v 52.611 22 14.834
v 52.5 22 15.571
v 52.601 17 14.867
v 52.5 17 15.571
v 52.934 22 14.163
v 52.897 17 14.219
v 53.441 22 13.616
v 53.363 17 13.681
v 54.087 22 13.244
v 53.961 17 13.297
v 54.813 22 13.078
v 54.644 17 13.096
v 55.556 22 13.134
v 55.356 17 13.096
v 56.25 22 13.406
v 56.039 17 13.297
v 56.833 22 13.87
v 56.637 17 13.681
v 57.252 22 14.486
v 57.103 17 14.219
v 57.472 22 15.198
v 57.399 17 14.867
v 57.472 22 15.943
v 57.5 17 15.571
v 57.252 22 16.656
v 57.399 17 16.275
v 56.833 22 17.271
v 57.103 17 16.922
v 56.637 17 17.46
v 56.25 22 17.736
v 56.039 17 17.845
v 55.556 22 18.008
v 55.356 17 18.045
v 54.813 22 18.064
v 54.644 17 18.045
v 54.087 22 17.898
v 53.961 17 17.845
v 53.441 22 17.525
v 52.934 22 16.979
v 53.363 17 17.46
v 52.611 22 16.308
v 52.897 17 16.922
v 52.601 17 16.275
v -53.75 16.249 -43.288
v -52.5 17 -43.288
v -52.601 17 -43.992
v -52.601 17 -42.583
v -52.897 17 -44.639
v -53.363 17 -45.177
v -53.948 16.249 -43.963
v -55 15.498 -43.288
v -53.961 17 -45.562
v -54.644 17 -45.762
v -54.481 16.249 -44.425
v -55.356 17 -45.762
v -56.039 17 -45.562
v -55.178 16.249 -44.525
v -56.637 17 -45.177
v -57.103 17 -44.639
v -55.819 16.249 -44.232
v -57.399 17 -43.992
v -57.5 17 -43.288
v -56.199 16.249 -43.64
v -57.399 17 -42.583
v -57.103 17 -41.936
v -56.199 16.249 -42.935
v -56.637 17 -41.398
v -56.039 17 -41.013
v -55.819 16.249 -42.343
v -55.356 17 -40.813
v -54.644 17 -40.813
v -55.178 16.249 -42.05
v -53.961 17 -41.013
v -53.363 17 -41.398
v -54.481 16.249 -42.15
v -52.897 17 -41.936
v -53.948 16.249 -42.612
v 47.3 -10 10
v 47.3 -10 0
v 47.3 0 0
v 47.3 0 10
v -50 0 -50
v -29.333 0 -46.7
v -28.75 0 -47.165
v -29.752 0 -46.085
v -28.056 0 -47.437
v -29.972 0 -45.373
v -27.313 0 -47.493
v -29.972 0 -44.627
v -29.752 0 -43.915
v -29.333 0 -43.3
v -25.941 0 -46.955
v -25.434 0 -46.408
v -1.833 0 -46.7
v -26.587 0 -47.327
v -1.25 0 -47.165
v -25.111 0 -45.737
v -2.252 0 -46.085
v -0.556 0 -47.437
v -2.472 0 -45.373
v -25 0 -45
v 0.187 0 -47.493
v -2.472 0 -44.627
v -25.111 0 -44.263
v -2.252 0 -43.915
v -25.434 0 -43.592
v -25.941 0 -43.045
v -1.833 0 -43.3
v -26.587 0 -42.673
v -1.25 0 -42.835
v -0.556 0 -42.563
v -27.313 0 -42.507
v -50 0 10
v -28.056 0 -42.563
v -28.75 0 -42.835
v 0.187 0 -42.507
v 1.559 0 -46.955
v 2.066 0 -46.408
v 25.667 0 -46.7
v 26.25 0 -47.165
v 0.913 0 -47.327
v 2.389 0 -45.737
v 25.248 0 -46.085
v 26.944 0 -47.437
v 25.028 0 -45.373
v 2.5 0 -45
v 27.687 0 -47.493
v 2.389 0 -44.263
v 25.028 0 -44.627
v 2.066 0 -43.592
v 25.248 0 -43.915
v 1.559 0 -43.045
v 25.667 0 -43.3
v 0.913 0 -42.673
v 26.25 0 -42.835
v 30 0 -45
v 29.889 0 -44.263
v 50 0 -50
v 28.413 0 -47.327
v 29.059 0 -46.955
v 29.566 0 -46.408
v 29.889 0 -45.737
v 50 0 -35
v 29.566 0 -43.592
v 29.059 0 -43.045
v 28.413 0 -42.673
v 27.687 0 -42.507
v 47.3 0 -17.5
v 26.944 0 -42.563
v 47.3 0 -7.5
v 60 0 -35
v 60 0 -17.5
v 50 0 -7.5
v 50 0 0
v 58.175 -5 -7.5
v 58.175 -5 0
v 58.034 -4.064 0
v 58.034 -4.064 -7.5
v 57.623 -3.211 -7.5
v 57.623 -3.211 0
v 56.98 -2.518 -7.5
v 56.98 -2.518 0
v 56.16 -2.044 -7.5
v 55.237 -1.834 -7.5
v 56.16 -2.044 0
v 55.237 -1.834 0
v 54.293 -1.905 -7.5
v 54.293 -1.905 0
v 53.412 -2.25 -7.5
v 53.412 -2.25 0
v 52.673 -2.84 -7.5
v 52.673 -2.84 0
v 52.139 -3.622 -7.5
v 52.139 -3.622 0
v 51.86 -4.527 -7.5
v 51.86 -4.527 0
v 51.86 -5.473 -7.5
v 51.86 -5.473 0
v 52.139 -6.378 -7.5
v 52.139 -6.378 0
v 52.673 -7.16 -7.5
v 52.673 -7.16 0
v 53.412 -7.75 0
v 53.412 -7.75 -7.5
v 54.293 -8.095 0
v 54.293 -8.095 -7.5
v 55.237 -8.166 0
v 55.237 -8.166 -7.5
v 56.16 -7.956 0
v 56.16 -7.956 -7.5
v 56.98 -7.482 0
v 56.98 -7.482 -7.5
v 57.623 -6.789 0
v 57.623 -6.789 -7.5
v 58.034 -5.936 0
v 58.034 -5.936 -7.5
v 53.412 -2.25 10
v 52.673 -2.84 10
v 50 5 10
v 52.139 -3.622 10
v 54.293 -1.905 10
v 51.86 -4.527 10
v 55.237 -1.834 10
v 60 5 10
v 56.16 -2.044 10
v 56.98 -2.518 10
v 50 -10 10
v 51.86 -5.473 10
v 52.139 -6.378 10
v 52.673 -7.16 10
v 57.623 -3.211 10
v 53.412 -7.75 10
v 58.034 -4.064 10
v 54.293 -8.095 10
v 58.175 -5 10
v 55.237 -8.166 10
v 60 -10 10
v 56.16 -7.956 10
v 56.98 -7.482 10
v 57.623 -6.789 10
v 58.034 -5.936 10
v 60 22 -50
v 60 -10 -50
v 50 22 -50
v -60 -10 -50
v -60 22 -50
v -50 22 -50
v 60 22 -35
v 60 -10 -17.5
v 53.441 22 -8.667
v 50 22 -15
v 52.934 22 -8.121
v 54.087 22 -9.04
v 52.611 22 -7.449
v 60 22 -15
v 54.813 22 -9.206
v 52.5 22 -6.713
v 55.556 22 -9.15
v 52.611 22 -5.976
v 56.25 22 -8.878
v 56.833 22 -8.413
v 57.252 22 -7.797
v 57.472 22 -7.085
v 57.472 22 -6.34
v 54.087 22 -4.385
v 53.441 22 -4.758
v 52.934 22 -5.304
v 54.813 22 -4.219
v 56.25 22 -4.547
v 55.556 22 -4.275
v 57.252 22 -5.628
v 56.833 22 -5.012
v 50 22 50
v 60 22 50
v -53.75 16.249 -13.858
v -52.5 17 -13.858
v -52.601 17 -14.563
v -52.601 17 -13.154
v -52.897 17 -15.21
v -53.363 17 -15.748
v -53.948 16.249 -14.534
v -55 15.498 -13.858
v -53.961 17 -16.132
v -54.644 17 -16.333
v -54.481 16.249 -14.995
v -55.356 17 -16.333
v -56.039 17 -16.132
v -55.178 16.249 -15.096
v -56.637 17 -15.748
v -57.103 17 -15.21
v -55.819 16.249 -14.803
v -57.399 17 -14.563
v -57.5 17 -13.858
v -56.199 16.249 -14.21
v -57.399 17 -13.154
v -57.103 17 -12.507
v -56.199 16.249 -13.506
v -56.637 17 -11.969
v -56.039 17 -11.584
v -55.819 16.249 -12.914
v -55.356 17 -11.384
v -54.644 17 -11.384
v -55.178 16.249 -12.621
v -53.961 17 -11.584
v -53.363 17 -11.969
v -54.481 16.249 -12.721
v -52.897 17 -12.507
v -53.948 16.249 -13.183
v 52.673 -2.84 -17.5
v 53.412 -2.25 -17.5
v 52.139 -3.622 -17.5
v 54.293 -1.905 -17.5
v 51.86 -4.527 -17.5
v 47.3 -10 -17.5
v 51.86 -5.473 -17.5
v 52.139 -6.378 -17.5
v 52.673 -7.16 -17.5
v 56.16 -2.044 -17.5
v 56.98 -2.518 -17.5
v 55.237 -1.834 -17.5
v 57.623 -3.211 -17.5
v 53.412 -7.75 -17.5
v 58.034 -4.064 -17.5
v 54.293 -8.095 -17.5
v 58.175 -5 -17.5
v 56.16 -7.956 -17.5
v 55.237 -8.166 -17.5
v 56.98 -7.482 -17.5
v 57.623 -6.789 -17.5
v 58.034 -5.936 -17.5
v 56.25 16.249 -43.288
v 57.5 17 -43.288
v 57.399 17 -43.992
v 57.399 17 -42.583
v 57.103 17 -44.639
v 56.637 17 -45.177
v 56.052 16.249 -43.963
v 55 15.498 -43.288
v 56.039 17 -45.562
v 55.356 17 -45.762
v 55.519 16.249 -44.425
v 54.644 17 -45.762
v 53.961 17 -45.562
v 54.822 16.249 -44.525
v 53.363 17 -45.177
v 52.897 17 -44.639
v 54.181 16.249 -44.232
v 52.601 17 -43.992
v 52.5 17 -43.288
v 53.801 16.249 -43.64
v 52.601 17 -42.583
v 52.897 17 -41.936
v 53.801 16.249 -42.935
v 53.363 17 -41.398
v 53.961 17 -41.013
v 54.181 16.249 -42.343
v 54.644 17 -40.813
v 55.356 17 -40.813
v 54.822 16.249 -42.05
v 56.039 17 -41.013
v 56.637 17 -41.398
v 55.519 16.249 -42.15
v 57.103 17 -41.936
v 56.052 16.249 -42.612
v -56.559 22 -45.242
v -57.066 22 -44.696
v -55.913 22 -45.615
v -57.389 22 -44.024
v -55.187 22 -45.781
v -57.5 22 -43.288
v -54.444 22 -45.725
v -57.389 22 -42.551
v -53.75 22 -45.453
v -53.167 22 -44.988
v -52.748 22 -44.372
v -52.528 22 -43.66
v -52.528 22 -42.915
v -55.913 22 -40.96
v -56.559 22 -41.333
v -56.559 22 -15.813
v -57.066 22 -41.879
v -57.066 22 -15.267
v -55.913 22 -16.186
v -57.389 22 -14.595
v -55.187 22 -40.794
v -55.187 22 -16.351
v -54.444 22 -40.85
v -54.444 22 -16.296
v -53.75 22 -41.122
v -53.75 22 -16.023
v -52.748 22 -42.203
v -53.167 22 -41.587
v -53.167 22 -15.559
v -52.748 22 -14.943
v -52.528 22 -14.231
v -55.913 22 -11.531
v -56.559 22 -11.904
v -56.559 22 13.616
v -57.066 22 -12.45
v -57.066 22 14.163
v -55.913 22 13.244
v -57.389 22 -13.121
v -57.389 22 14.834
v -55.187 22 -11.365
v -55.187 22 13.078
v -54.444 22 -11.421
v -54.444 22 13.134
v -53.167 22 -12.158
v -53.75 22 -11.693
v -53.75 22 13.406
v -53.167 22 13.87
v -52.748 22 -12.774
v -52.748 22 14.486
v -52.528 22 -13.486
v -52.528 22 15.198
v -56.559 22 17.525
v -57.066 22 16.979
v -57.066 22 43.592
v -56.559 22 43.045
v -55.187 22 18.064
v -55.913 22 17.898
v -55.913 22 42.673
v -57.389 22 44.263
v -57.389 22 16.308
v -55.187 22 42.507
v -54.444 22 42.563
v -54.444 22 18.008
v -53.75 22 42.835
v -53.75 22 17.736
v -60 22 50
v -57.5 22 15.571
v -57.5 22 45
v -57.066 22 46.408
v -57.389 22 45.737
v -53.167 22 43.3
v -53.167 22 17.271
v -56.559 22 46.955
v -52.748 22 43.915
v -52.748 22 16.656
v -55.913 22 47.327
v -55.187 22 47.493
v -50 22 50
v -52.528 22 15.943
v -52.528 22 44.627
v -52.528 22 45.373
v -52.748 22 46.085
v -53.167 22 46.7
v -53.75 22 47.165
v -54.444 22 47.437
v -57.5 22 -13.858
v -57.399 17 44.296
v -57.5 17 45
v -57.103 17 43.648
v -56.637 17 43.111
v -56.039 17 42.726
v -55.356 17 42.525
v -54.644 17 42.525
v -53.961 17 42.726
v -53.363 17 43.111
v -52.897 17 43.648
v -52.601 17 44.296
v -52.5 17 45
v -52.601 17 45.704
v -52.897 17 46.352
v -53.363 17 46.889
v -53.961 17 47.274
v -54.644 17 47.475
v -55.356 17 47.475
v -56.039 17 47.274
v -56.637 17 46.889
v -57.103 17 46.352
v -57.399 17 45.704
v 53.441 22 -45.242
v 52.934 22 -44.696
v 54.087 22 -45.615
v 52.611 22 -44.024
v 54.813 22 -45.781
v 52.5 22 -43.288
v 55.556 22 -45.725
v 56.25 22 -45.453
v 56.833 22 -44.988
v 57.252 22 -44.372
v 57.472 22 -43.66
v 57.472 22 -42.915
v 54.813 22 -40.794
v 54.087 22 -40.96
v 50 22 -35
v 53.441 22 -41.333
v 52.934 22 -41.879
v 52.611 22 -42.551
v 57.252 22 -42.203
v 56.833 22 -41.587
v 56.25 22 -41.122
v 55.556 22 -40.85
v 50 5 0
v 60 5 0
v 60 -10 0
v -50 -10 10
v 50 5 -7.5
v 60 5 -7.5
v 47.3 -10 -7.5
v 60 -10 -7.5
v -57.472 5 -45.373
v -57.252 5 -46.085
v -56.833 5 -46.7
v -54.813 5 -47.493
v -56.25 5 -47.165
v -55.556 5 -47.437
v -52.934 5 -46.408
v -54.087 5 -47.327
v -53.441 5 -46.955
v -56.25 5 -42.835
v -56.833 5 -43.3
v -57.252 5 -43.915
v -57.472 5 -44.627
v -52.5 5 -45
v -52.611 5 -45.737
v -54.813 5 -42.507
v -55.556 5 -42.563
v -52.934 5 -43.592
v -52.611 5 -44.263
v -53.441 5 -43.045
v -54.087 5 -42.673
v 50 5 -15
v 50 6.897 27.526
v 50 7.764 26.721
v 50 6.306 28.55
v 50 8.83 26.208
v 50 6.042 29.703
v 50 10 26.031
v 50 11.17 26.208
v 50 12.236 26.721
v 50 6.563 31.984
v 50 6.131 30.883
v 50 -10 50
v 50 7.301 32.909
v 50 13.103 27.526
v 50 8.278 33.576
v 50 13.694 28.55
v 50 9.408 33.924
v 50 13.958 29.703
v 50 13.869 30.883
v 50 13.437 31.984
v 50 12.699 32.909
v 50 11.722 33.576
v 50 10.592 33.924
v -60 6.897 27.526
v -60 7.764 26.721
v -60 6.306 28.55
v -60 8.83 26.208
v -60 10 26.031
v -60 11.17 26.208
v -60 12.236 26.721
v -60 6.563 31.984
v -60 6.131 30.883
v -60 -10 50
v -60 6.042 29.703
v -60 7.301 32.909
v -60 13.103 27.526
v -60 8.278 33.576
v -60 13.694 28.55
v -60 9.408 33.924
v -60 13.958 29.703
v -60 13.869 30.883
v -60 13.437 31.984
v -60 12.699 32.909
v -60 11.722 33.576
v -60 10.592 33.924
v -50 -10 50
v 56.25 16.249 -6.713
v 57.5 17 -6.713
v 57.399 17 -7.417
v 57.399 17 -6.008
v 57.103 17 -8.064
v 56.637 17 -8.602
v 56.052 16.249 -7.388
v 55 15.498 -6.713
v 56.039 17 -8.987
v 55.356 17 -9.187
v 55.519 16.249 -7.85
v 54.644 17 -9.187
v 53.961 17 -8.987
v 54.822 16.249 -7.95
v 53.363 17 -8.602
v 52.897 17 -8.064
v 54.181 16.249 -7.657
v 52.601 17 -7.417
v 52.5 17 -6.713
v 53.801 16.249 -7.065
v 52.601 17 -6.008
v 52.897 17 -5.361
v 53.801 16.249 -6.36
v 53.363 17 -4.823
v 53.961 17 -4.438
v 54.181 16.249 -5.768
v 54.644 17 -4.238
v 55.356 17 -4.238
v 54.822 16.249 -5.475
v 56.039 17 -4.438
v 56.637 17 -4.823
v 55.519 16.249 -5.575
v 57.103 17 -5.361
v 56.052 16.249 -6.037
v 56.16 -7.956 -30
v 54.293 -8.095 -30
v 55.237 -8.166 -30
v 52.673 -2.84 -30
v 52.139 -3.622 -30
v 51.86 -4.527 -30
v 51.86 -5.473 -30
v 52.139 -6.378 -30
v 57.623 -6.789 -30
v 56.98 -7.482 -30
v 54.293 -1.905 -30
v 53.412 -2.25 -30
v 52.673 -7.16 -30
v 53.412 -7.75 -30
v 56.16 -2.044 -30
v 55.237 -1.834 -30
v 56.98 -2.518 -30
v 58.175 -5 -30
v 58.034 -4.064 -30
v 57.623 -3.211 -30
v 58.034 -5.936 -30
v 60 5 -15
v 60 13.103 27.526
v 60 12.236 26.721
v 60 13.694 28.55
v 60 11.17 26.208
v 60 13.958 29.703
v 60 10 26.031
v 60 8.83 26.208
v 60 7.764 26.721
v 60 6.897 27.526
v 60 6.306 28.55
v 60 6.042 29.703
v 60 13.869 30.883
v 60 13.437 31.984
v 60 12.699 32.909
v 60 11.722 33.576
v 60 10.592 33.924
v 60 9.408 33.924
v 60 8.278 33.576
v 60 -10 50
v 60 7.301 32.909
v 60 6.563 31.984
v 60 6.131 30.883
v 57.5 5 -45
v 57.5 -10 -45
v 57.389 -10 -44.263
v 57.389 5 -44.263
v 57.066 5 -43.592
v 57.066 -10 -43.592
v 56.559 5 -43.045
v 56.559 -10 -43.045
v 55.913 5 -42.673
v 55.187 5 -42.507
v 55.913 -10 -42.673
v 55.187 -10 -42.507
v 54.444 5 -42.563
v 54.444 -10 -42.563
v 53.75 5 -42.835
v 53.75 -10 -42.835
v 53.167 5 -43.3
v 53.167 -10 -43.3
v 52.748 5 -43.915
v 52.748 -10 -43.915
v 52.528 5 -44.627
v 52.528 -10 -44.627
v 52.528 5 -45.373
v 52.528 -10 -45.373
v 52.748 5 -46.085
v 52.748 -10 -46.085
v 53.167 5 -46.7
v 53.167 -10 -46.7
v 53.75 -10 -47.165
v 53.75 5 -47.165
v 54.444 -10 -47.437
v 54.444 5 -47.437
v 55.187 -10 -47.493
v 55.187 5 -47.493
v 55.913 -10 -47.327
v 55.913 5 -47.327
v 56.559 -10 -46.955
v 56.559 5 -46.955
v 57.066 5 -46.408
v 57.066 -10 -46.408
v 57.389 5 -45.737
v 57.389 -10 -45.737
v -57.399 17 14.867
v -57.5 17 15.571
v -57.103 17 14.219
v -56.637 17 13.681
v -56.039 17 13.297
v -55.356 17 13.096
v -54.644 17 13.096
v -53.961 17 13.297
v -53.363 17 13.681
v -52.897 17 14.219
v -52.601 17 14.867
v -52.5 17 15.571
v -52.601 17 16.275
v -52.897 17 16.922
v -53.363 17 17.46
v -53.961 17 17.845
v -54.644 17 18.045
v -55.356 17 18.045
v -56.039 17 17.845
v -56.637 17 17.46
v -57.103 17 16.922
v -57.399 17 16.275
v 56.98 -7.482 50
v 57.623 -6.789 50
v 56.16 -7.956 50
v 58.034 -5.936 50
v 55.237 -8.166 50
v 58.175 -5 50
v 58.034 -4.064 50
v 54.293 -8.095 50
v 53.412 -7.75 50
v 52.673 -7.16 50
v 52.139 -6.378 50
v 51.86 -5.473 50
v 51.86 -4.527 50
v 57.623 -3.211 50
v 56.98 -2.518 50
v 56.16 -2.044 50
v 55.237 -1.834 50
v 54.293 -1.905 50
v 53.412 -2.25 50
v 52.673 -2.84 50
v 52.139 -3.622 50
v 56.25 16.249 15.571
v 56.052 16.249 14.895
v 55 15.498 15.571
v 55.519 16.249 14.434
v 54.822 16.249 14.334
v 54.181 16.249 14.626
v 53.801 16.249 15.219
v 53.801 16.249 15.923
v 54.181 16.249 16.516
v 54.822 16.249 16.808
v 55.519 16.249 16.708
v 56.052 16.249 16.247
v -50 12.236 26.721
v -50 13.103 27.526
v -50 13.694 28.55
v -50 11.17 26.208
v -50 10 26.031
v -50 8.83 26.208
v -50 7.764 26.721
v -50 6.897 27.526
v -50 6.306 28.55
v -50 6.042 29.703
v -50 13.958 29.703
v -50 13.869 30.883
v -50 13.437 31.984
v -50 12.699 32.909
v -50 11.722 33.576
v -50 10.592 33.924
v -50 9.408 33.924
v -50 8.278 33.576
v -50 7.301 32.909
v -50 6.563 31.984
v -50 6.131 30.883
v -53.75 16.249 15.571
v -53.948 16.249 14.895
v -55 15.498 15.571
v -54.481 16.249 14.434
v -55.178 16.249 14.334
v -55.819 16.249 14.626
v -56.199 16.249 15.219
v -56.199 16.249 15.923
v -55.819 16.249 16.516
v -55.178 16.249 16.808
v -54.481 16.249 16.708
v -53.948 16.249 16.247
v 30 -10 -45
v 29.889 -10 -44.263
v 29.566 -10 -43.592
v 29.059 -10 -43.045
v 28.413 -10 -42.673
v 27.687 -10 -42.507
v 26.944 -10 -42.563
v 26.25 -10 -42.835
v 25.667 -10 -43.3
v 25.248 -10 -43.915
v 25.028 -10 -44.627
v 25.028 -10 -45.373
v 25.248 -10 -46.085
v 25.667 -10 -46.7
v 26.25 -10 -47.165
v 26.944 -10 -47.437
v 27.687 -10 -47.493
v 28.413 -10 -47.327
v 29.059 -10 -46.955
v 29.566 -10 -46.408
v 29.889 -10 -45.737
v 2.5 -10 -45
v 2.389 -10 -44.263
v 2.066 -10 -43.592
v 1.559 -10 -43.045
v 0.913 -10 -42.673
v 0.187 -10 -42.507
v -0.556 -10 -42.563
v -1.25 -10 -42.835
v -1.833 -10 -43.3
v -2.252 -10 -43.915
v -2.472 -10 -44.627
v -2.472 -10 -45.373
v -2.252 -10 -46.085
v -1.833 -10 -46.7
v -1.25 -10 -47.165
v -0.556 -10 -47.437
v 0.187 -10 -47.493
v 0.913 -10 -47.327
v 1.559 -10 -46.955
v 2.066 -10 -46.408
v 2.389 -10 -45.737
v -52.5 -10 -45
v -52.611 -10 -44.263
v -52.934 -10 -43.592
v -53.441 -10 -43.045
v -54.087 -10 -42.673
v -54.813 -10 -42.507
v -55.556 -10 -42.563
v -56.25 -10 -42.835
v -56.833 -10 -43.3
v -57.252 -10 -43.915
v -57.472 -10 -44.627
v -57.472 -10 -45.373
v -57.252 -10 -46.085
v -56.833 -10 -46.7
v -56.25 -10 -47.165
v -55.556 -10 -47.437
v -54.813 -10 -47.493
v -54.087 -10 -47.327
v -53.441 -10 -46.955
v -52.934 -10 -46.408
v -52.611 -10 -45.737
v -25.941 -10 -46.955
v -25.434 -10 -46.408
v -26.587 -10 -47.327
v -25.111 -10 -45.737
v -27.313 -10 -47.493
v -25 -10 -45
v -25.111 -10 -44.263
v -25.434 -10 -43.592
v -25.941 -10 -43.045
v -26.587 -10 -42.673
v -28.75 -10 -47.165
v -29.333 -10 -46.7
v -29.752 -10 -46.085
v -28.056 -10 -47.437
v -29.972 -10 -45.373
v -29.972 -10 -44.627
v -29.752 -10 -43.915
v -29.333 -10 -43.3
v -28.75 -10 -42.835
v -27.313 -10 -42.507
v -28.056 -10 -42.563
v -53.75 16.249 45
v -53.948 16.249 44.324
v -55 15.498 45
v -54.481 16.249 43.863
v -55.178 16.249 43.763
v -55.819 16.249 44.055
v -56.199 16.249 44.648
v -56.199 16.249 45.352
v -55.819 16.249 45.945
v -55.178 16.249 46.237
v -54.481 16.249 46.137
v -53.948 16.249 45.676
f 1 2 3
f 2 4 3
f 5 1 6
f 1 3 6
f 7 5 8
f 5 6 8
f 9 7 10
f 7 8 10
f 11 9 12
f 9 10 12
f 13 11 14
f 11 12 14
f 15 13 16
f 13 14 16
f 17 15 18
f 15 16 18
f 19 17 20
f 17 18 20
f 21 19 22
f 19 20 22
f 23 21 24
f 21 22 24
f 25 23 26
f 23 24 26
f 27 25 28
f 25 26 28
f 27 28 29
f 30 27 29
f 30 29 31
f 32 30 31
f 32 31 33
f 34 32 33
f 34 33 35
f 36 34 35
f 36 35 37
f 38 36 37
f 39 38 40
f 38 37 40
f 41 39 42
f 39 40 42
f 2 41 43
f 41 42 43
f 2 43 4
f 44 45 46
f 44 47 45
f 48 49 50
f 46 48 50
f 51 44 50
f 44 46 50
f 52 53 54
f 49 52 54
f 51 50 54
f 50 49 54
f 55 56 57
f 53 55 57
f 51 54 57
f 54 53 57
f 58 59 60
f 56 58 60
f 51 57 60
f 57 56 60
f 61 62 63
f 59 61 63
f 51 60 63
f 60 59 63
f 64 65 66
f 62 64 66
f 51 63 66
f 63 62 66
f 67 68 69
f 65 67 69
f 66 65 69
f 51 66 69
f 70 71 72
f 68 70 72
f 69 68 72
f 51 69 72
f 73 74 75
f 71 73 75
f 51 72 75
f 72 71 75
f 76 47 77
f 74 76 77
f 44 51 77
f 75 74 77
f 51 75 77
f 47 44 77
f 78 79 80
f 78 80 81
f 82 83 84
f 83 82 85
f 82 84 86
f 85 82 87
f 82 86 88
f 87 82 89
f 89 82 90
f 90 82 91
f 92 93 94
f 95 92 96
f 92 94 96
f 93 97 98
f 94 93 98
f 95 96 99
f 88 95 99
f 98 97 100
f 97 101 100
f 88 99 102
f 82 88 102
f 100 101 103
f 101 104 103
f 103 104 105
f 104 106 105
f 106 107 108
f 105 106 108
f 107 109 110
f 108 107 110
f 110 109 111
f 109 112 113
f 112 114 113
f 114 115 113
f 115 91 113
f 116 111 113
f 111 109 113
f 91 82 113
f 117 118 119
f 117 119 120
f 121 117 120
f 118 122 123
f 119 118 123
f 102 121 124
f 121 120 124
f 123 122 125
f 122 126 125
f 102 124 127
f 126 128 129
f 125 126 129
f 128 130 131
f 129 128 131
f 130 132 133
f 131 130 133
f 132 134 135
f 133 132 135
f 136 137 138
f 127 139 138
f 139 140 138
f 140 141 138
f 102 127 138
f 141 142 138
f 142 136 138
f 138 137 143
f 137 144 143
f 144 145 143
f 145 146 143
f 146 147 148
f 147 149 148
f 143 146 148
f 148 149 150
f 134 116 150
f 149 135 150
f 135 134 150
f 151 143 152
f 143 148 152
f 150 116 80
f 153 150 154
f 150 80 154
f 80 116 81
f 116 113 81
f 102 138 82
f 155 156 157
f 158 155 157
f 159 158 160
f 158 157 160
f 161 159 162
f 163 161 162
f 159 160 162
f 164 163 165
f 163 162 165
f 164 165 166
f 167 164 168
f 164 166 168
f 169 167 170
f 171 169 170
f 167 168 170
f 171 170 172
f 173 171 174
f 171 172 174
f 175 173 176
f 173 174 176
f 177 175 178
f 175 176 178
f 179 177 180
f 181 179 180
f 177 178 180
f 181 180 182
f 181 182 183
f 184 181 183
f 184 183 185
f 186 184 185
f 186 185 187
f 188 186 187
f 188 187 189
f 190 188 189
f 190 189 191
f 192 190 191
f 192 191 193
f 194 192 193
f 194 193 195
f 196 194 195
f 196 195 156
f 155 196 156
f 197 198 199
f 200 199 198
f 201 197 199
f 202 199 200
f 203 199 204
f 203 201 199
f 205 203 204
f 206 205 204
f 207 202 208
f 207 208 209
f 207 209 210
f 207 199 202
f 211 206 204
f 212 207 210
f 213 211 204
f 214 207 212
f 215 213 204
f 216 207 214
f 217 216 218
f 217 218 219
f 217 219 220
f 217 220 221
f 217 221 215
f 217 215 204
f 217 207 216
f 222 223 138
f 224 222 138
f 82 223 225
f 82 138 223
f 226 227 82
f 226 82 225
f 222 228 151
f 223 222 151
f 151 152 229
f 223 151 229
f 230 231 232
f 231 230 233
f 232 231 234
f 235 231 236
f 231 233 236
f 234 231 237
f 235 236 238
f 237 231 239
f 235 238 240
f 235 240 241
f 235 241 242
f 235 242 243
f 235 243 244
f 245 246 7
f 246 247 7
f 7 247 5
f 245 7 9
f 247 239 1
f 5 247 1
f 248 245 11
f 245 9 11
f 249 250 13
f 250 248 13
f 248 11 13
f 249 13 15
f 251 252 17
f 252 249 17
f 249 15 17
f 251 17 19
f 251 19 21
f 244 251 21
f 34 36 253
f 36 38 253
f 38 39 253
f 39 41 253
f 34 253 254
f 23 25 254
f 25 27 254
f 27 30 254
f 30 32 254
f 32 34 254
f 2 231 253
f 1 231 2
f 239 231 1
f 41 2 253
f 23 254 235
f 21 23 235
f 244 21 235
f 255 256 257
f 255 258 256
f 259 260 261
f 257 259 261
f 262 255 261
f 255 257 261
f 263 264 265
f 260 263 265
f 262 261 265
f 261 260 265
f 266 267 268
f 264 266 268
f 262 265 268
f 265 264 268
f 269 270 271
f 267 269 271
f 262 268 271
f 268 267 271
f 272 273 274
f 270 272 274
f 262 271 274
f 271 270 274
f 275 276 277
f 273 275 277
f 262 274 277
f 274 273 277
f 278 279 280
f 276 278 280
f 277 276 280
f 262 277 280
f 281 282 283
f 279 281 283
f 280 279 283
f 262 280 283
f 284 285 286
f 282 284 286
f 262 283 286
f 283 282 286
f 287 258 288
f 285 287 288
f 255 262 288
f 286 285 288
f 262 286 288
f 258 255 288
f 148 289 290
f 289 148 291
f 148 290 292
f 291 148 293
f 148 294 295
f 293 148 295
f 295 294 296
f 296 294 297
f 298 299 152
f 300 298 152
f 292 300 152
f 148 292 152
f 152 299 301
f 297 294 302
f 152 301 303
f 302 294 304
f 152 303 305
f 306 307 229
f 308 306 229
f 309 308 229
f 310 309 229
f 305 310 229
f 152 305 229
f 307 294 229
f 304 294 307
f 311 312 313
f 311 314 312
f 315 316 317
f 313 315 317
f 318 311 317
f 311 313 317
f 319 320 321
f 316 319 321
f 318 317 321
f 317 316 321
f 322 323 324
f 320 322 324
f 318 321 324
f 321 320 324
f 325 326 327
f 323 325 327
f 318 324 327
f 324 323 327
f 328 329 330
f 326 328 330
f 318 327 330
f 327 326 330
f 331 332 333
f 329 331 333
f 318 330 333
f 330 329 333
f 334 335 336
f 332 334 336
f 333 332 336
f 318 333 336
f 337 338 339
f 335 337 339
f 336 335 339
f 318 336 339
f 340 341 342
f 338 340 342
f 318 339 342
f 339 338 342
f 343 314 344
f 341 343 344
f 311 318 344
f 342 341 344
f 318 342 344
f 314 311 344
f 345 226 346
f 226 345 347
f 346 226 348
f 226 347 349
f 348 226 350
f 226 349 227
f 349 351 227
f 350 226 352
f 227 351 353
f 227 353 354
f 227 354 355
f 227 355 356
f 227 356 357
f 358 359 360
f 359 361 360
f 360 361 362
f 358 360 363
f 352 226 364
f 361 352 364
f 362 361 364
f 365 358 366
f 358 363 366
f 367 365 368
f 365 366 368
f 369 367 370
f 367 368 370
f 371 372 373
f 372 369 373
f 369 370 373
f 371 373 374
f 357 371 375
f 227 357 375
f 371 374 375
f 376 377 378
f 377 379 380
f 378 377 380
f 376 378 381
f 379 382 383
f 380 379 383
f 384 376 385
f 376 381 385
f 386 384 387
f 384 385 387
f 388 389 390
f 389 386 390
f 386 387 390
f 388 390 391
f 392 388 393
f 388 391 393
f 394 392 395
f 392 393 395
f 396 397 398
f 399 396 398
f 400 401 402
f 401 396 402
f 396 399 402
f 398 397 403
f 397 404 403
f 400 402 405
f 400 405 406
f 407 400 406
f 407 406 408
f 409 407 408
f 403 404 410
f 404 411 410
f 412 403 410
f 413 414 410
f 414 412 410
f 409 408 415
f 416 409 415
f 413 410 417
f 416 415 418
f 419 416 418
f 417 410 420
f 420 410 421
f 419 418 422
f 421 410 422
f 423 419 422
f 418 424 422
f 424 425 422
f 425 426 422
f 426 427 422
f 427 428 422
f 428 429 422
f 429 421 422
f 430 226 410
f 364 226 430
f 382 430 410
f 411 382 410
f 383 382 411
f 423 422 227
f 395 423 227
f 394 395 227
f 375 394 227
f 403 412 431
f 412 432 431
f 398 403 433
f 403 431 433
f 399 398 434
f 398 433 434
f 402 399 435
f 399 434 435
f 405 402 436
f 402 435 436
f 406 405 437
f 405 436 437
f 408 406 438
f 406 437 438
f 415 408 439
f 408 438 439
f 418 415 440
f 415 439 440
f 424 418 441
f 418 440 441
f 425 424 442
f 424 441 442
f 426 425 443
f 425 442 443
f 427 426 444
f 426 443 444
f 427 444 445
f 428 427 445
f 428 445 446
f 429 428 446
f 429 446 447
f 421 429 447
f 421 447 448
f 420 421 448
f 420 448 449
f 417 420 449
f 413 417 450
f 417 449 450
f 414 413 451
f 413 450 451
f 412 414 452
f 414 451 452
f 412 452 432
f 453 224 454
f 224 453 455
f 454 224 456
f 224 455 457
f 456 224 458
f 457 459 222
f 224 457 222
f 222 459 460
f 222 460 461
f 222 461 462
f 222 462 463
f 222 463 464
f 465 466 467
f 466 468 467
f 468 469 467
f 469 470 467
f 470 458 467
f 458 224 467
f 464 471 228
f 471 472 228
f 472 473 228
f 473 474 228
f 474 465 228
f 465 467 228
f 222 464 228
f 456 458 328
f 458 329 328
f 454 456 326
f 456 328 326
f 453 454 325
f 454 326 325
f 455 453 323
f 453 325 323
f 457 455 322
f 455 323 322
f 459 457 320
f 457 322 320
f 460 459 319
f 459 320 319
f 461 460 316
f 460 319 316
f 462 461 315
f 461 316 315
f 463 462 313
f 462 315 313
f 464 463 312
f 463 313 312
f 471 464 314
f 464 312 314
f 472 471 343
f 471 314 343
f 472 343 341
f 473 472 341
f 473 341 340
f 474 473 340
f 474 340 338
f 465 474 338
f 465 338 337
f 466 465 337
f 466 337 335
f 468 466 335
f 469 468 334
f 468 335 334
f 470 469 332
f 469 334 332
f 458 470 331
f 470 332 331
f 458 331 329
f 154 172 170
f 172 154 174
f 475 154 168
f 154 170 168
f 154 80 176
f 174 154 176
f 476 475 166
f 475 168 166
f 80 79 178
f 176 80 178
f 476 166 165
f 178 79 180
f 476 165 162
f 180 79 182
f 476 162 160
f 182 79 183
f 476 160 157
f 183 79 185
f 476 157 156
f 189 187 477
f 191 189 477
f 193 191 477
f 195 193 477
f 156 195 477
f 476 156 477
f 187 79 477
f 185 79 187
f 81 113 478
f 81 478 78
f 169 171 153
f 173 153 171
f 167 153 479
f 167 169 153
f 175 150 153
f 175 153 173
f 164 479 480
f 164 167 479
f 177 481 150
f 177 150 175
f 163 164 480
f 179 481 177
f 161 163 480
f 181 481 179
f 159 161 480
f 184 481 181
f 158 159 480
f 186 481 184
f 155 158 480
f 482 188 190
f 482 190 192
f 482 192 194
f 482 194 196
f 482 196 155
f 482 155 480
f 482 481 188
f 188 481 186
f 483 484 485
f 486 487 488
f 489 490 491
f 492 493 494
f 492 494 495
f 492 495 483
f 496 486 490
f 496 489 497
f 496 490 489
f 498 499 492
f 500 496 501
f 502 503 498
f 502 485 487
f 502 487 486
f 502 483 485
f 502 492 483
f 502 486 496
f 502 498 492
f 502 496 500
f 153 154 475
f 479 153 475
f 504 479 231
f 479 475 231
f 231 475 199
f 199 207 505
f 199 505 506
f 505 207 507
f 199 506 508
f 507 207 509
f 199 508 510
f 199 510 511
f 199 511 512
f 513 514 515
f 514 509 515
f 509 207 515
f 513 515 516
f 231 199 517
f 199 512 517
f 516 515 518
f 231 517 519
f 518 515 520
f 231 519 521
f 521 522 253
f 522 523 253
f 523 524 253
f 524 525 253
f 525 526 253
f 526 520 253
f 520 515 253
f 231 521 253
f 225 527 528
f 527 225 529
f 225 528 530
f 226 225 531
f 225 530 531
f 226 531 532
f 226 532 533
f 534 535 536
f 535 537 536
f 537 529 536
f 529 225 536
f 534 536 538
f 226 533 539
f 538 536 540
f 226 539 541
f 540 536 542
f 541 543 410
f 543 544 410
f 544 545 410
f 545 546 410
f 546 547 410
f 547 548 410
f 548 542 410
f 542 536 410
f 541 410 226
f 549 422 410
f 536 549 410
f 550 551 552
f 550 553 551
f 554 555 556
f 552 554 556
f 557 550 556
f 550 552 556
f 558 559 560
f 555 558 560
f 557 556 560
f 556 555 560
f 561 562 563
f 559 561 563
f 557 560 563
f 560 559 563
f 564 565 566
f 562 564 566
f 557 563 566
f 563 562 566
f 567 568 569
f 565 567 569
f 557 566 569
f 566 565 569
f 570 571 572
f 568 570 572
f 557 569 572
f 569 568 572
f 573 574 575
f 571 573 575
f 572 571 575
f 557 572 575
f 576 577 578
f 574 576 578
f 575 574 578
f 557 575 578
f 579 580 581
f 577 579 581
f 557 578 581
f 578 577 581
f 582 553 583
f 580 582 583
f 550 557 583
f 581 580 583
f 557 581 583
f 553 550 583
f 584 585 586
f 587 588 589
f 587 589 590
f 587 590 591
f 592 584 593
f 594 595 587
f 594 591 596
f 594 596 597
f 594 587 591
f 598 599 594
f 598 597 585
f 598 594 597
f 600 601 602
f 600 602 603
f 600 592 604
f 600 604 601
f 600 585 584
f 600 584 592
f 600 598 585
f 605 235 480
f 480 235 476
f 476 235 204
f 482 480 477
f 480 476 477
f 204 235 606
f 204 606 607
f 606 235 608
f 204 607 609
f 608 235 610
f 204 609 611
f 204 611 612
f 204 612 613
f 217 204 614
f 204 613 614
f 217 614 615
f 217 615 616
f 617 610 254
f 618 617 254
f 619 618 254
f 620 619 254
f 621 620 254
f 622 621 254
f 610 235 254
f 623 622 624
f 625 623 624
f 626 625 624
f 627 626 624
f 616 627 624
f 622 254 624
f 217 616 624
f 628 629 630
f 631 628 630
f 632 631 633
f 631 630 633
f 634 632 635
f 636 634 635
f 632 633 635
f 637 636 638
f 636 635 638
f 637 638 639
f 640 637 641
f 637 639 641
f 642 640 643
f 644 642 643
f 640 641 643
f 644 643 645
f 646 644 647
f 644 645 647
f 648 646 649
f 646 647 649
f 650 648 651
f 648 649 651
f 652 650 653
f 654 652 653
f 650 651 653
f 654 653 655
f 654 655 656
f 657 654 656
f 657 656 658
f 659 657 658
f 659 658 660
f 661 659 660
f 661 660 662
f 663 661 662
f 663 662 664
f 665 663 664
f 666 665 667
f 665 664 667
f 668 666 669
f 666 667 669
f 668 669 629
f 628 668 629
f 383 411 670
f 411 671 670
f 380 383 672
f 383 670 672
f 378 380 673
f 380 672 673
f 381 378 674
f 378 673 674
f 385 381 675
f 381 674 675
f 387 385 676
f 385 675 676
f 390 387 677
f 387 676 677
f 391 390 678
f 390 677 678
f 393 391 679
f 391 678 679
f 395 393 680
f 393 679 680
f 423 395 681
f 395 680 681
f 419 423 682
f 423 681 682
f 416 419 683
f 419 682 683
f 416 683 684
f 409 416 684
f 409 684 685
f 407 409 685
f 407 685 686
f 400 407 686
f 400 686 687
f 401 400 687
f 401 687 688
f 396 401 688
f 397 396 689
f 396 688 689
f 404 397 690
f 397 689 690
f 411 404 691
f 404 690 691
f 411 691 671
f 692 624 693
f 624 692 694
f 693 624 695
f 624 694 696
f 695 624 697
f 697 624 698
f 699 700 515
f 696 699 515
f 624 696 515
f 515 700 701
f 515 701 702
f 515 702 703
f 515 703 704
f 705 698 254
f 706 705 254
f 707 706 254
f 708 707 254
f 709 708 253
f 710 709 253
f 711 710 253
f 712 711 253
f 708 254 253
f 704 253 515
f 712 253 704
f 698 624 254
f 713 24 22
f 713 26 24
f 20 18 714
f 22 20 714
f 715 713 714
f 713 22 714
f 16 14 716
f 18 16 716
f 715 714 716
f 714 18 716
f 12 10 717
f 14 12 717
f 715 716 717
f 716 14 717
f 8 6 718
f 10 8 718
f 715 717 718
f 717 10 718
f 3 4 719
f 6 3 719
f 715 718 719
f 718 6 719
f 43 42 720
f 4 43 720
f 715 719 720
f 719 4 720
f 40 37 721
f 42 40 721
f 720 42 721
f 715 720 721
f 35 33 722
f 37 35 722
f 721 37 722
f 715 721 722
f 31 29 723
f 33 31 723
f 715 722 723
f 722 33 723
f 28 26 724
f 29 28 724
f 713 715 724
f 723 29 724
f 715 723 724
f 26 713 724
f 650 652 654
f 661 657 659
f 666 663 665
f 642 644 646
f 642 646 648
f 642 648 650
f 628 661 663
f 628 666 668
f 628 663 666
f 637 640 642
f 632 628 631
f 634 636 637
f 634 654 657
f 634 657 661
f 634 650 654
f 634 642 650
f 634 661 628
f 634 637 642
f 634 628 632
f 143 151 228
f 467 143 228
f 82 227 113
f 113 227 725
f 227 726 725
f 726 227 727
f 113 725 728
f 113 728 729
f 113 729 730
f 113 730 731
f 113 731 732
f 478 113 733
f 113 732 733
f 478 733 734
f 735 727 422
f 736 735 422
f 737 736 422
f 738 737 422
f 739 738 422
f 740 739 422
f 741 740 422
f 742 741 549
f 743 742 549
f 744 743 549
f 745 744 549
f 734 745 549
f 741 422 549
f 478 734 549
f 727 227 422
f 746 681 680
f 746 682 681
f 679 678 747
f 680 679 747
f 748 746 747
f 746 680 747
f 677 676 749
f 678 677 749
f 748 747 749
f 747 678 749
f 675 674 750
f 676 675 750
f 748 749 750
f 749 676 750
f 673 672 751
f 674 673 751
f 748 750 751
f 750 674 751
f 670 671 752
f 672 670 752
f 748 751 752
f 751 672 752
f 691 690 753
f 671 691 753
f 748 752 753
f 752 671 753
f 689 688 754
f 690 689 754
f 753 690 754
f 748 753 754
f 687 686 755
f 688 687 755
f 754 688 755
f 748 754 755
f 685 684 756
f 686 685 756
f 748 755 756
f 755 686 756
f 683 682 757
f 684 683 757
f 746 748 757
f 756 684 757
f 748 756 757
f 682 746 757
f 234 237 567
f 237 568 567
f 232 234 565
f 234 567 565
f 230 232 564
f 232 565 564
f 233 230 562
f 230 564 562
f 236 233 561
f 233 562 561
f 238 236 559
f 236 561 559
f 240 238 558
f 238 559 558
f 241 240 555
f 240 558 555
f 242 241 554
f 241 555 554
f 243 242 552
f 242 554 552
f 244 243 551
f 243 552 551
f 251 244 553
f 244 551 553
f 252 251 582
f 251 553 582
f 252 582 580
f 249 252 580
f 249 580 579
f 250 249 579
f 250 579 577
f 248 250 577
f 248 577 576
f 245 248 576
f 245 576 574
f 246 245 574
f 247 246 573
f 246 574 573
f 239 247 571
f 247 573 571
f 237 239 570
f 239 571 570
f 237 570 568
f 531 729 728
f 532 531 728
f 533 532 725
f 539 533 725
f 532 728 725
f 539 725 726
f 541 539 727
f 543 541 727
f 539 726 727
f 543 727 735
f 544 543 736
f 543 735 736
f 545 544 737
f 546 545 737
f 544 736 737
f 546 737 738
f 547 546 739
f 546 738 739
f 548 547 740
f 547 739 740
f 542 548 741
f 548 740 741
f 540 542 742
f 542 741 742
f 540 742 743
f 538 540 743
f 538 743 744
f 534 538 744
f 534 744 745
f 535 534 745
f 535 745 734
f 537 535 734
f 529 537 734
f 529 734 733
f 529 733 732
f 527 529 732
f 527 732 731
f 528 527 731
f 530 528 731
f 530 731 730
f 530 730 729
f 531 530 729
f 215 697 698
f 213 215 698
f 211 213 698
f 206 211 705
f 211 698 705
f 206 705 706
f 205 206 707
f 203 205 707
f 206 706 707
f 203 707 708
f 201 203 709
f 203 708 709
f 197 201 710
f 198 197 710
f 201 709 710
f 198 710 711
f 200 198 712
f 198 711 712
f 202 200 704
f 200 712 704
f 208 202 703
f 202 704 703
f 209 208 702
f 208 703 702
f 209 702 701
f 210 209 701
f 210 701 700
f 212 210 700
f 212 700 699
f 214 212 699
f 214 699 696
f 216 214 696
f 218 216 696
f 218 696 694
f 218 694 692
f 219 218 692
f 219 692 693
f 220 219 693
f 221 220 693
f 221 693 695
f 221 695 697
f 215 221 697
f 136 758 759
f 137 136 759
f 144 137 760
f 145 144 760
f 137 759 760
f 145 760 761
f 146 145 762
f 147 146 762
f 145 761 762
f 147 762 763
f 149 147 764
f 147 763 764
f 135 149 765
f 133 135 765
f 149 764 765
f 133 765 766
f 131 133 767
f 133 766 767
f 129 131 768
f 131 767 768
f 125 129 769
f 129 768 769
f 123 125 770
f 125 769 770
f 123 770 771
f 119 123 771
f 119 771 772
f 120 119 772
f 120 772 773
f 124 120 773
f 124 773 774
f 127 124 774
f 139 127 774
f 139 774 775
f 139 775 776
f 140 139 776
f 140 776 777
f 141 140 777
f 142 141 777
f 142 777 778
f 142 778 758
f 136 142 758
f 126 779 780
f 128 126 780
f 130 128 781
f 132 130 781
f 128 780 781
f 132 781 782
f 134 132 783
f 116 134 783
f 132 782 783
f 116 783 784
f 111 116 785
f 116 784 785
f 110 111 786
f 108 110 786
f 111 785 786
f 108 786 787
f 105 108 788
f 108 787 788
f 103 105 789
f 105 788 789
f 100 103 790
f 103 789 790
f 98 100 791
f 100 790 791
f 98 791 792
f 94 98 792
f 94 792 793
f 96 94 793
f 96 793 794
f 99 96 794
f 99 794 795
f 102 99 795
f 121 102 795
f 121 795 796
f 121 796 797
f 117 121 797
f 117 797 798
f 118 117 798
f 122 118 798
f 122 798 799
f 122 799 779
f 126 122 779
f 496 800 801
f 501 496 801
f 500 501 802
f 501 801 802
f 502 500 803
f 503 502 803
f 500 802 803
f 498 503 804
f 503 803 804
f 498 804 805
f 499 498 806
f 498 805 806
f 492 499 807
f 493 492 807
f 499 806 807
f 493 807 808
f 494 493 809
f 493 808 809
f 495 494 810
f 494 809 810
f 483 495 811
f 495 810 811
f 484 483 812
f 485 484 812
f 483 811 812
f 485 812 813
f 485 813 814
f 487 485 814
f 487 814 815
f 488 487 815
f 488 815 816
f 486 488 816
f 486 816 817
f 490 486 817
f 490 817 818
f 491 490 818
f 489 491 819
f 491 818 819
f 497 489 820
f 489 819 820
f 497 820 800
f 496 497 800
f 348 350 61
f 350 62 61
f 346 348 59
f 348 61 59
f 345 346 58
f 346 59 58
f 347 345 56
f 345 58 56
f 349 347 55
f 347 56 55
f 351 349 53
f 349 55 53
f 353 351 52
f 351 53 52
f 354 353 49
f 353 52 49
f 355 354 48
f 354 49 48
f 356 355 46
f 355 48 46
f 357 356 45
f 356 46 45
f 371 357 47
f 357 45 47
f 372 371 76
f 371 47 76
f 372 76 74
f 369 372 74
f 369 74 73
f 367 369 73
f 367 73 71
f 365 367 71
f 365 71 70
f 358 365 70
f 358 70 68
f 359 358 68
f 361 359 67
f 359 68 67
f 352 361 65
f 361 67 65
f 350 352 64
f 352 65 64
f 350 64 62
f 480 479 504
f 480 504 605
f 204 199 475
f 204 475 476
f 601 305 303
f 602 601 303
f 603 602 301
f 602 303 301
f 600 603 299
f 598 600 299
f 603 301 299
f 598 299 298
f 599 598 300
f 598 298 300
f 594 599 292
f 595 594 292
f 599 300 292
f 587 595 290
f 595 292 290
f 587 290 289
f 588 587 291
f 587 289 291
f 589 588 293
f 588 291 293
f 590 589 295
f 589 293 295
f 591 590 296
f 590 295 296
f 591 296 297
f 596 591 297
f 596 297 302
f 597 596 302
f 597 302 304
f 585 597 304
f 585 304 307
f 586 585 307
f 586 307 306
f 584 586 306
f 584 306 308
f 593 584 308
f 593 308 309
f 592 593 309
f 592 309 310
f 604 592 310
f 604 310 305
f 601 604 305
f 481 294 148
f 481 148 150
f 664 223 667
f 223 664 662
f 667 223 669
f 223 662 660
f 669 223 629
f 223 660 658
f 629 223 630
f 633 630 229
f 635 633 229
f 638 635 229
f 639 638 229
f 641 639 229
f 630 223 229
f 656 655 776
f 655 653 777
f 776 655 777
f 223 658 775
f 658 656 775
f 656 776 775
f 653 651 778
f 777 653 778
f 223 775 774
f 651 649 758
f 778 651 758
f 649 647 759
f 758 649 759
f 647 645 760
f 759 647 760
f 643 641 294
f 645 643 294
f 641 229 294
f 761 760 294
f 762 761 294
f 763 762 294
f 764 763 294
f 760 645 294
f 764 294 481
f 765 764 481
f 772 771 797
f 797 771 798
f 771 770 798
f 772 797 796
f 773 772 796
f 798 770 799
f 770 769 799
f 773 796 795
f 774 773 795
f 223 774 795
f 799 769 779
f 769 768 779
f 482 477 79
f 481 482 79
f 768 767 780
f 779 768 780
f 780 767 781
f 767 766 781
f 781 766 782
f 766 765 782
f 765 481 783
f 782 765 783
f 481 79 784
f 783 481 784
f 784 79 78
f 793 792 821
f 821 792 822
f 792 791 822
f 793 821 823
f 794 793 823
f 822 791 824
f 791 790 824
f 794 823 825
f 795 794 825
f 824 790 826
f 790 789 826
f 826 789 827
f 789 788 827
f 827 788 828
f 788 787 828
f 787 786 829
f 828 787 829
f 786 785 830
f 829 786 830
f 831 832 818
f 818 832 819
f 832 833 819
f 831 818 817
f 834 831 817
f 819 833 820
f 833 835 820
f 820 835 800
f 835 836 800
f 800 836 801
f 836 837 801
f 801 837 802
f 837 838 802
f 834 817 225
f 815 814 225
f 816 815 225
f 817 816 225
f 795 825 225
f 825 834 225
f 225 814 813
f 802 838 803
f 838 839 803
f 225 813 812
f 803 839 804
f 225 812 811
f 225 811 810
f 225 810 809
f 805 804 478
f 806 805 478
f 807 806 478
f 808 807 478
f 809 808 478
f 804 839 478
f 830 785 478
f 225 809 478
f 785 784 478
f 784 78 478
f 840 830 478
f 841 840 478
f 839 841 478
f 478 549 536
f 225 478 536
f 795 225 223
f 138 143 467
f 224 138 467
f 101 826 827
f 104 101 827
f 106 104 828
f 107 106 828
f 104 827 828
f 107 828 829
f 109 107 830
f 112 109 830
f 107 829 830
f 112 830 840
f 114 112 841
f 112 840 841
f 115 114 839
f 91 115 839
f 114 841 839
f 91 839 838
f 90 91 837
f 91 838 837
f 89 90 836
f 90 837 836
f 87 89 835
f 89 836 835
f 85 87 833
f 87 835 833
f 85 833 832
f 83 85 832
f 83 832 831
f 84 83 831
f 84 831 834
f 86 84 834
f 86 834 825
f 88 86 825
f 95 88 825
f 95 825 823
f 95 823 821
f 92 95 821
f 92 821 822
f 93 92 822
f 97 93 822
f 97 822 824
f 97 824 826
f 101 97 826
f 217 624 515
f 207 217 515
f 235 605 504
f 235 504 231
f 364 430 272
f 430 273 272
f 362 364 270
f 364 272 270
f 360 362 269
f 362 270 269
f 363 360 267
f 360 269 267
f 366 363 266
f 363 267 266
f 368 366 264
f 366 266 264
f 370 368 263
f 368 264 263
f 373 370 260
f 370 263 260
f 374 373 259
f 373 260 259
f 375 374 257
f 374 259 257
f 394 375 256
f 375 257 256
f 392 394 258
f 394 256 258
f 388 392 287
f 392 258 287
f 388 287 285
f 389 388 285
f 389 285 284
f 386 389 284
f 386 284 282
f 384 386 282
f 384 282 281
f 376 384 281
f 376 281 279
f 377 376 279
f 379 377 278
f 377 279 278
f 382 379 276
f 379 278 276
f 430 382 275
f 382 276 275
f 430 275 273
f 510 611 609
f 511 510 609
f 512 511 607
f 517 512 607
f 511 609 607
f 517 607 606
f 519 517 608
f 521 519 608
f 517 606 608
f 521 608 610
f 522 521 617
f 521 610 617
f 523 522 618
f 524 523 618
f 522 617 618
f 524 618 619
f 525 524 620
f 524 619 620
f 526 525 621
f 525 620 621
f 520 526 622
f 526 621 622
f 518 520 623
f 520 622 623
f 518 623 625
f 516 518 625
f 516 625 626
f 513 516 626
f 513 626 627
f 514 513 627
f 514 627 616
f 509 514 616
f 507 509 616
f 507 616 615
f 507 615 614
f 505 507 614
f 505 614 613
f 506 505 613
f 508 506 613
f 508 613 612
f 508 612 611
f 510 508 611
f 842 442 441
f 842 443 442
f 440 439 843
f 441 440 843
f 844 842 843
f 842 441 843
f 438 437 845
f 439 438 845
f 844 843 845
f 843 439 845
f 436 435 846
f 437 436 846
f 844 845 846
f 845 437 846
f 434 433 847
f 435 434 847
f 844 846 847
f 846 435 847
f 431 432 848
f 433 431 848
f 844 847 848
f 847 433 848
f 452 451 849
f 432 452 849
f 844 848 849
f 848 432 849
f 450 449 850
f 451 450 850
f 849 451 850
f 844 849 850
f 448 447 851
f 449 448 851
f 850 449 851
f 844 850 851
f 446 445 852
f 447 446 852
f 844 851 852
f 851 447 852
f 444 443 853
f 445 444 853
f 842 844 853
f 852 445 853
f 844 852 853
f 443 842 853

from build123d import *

# Parameters (mm, degrees)
BOSS_EXTRUDE3_DEPTH       = 50
SKETCH7_W                 = 100
SKETCH7_H                 = 40
CUT_EXTRUDE1_DEPTH        = 11
SKETCH8_R                 = 3.96875
CUT_EXTRUDE2_DEPTH        = 121
CUT_EXTRUDE3_REACH        = 122
SKETCH9_W                 = 20
SKETCH9_H                 = 22
SKETCH10_R                = 3.175
CUT_EXTRUDE4_DEPTH        = 80
SKETCH11_W                = 12.7
SKETCH11_H                = 10
CUT_EXTRUDE5_DEPTH        = 15
F_5_0MM_DOWEL_HOLE1_D     = 5
F_5_0MM_DOWEL_HOLE1_DEPTH = 25
F_5_0MM_DOWEL_HOLE1_TIP   = 1.502151548
SKETCH15_R                = 2.5
CUT_EXTRUDE6_DEPTH        = 15


with BuildPart() as part:
    # Sketch6 → Boss-Extrude3 (new body, symmetric)
    with BuildSketch(Plane.XY):
        Polygon((-60, 22), (-50, 22), (-50, 0), (50, 0), (50, 22), (60, 22), (60, -10), (-60, -10), align=None)
    extrude(amount=BOSS_EXTRUDE3_DEPTH, both=True)

    # Sketch7 → Cut-Extrude1 (cut, through all)
    with BuildSketch(Plane(origin=(0, 0, 0), x_dir=(1, 0, 0), z_dir=(0, 1, 0))):
        with Locations((0, -30)):
            Rectangle(SKETCH7_W, SKETCH7_H)
    extrude(amount=-CUT_EXTRUDE1_DEPTH, mode=Mode.SUBTRACT)

    # Sketch8 → Cut-Extrude2 (cut, through all)
    with BuildSketch(Plane(origin=(60, 0, 0), x_dir=(0, 0, -1), z_dir=(1, 0, 0))):
        with Locations((-30, 10)):
            Circle(SKETCH8_R)
    extrude(amount=-CUT_EXTRUDE2_DEPTH, mode=Mode.SUBTRACT)

    # Sketch9 → Cut-Extrude3 (cut, up to next)
    with BuildSketch(Plane(origin=(60, 0, 0), x_dir=(0, 0, -1), z_dir=(1, 0, 0)), mode=Mode.PRIVATE) as cut_extrude3_sk1:
        with Locations((25, 11)):
            Rectangle(SKETCH9_W, SKETCH9_H)
    cut_extrude3_tool1 = extrude(cut_extrude3_sk1.sketch, amount=-CUT_EXTRUDE3_REACH, mode=Mode.PRIVATE) & part.part
    add(cut_extrude3_tool1.solids().sort_by_distance((60, 11, -25))[0], mode=Mode.SUBTRACT)

    # Sketch10 → Cut-Extrude4 (cut)
    with BuildSketch(Plane.XY.offset(50)):
        with Locations((55, -5)):
            Circle(SKETCH10_R)
    extrude(amount=-CUT_EXTRUDE4_DEPTH, mode=Mode.SUBTRACT)

    # Sketch11 → Cut-Extrude5 (cut)
    with BuildSketch(Plane.XZ.offset(10)):
        with Locations((53.65, 5)):
            Rectangle(SKETCH11_W, SKETCH11_H)
        with Locations((53.65, -12.5)):
            Rectangle(SKETCH11_W, SKETCH11_H)
    extrude(amount=-CUT_EXTRUDE5_DEPTH, mode=Mode.SUBTRACT)

    # Ø5.0mm Dowel Hole1
    with Locations(Plane(origin=(-676.293536786, 42.00000002, -1303.282701689), x_dir=(1, 0, 0), z_dir=(0, 1, 0))):
        with Locations((731.293536786, -1318.853535022), (621.293536786, -1318.853535022), (621.293536786, -1348.282701689), (621.293536786, -1259.995201689), (731.293536786, -1259.995201689), (731.293536786, -1296.570201689), (621.293536786, -1289.424368355), (748.990363778, -1262.26989625)):
            Hole(F_5_0MM_DOWEL_HOLE1_D / 2, depth=F_5_0MM_DOWEL_HOLE1_DEPTH)
            with Locations((0, 0, -(F_5_0MM_DOWEL_HOLE1_DEPTH + F_5_0MM_DOWEL_HOLE1_TIP / 2))):  # 118° drill point
                Cone(0, F_5_0MM_DOWEL_HOLE1_D / 2, F_5_0MM_DOWEL_HOLE1_TIP, mode=Mode.SUBTRACT)

    # Sketch15 → Cut-Extrude6 (cut)
    with BuildSketch(Plane.XZ.offset(10)):
        with Locations((-55, -45)):
            Circle(SKETCH15_R)
        with Locations((-27.5, -45)):
            Circle(SKETCH15_R)
        with Locations((0, -45)):
            Circle(SKETCH15_R)
        with Locations((27.5, -45)):
            Circle(SKETCH15_R)
        with Locations((55, -45)):
            Circle(SKETCH15_R)
    extrude(amount=-CUT_EXTRUDE6_DEPTH, mode=Mode.SUBTRACT)


solid = part.part
